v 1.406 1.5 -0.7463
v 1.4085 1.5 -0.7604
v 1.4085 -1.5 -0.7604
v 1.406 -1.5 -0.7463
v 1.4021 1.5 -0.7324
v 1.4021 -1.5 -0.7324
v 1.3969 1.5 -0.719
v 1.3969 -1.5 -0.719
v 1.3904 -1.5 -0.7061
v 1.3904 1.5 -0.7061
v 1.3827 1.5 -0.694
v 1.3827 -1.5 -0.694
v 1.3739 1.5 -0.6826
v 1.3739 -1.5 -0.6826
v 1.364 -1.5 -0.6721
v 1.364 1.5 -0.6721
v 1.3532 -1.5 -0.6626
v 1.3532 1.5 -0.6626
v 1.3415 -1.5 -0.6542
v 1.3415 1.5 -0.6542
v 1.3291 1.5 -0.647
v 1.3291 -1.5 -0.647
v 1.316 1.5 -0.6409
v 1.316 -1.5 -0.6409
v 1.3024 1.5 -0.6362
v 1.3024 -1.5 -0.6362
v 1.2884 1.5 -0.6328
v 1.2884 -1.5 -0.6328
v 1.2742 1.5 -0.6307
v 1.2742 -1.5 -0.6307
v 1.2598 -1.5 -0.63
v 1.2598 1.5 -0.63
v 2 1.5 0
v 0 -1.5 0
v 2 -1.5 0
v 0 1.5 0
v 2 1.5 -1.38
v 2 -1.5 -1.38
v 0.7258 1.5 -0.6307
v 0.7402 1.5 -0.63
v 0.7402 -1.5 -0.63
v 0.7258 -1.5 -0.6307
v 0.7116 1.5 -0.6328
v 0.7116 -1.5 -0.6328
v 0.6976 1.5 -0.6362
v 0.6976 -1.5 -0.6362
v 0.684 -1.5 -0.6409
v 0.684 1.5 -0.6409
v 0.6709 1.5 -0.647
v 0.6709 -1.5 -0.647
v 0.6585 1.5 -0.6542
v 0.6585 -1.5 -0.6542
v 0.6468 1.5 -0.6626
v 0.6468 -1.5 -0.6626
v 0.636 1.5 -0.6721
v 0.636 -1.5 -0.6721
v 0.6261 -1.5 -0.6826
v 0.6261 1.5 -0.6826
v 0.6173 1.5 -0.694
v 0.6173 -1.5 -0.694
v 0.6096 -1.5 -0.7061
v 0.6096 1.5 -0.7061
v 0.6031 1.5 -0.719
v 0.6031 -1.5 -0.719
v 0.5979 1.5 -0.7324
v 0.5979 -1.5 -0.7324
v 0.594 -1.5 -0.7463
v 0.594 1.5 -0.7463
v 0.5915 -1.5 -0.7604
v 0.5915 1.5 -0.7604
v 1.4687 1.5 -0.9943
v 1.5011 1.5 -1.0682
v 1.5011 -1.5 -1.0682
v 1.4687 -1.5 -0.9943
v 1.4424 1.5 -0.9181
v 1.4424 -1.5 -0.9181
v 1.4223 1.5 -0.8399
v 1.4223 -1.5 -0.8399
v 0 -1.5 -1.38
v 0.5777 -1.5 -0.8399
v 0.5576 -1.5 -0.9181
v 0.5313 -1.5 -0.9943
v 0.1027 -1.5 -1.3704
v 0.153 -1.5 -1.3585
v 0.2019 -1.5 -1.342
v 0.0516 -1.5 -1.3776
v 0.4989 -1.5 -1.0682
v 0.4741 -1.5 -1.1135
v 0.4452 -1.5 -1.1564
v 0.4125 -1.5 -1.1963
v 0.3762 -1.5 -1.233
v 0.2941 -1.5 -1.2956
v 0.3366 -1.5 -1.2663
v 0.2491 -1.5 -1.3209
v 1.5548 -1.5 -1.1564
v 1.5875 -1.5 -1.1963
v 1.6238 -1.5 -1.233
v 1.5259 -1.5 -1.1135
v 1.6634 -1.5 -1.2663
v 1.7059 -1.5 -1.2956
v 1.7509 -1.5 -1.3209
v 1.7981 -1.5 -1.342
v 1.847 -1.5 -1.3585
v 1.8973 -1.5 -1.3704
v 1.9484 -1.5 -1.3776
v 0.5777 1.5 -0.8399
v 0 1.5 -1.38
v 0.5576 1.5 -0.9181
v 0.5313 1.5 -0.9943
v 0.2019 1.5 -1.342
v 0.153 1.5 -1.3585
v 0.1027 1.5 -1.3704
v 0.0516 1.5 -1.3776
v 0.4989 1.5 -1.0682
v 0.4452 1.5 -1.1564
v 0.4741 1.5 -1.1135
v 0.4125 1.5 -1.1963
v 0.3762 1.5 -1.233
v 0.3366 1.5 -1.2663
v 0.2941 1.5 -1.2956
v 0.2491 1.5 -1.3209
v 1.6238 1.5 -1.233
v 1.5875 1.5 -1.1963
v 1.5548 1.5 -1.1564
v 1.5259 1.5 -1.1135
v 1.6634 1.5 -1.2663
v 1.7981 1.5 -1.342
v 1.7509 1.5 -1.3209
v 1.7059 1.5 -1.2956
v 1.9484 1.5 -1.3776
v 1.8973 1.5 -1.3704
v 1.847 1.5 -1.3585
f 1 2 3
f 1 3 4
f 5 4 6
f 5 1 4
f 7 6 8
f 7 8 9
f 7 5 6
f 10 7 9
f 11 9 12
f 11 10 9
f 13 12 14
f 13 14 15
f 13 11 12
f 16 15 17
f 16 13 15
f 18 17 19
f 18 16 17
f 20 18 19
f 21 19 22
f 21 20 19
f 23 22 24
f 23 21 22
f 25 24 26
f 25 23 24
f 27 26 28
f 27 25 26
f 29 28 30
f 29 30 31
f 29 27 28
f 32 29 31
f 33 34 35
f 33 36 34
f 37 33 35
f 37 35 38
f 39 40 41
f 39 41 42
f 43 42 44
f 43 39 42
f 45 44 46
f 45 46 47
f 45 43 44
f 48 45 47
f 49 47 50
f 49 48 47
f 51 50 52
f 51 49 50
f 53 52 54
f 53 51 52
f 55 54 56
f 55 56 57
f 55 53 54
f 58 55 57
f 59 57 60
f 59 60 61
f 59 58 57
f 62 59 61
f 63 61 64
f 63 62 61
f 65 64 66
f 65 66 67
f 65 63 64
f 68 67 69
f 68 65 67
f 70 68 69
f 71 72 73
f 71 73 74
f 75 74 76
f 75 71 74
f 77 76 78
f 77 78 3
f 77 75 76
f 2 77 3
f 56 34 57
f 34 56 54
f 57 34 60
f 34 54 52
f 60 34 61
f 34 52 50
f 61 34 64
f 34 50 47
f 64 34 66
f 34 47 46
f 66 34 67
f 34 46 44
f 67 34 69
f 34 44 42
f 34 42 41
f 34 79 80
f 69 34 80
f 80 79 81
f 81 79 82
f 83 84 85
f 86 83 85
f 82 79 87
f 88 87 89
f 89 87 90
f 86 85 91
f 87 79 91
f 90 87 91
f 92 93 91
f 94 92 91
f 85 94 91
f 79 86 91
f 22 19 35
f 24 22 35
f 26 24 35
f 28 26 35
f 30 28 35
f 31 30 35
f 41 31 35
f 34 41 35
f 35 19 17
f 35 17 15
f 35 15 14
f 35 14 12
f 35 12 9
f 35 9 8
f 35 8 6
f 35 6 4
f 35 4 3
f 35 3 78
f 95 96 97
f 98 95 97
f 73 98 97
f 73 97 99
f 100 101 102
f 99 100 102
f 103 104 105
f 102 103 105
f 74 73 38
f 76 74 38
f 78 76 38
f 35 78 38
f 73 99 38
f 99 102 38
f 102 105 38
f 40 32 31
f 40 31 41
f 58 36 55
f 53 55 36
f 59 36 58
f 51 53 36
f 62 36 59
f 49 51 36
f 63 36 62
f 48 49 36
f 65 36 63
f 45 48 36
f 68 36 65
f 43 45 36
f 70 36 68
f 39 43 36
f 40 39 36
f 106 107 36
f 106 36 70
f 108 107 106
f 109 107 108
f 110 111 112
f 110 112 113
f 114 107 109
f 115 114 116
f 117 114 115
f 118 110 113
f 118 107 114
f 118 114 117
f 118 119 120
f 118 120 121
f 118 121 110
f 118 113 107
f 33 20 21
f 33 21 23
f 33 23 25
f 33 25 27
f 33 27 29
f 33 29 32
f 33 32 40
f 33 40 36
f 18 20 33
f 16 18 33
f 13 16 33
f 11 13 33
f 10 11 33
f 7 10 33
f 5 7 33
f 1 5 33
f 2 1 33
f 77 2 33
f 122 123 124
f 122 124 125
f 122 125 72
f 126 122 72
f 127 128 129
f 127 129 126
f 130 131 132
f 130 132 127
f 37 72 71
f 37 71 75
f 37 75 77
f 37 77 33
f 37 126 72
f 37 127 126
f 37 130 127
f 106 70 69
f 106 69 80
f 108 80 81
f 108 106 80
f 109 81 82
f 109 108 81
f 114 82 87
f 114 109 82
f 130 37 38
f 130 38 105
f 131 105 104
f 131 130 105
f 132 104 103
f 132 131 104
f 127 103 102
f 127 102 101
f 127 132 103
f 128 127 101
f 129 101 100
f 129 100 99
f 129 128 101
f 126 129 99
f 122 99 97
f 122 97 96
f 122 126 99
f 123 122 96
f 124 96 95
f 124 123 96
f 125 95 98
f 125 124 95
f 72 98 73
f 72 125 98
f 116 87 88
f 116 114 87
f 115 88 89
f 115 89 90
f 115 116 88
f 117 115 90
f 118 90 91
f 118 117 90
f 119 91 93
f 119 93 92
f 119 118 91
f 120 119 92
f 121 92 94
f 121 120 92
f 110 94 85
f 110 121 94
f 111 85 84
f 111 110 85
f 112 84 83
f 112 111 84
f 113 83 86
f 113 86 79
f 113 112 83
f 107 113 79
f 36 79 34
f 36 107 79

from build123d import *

# Parameters (mm, degrees)
BOSS_EXTRUDE1_DEPTH = 1.5


with BuildPart() as part:
    # Sketch1 → Boss-Extrude1 (new, symmetric)
    with BuildSketch(Plane(origin=(0, 0, 0), x_dir=(1, 0, 0), z_dir=(0, 1, 0))):
        with BuildLine():
            Line((0, 0), (2, 0))
            Line((2, 0), (2, 1.38))
            ThreePointArc((2, 1.38), (1.705850588, 1.295639059), (1.501123596, 1.068202247))
            ThreePointArc((1.501123596, 1.068202247), (1.442388286, 0.918062154), (1.408543109, 0.760434783))
            ThreePointArc((1.408543109, 0.760434783), (1.358731646, 0.667228588), (1.259824575, 0.63))
            Line((1.259824575, 0.63), (0.740175425, 0.63))
            ThreePointArc((0.740175425, 0.63), (0.641268354, 0.667228588), (0.591456891, 0.760434783))
            ThreePointArc((0.591456891, 0.760434783), (0.557611714, 0.918062154), (0.498876404, 1.068202247))
            ThreePointArc((0.498876404, 1.068202247), (0.294149412, 1.295639059), (0, 1.38))
            Line((0, 1.38), (0, 0))
        make_face()
    extrude(amount=BOSS_EXTRUDE1_DEPTH, both=True)


solid = part.part
